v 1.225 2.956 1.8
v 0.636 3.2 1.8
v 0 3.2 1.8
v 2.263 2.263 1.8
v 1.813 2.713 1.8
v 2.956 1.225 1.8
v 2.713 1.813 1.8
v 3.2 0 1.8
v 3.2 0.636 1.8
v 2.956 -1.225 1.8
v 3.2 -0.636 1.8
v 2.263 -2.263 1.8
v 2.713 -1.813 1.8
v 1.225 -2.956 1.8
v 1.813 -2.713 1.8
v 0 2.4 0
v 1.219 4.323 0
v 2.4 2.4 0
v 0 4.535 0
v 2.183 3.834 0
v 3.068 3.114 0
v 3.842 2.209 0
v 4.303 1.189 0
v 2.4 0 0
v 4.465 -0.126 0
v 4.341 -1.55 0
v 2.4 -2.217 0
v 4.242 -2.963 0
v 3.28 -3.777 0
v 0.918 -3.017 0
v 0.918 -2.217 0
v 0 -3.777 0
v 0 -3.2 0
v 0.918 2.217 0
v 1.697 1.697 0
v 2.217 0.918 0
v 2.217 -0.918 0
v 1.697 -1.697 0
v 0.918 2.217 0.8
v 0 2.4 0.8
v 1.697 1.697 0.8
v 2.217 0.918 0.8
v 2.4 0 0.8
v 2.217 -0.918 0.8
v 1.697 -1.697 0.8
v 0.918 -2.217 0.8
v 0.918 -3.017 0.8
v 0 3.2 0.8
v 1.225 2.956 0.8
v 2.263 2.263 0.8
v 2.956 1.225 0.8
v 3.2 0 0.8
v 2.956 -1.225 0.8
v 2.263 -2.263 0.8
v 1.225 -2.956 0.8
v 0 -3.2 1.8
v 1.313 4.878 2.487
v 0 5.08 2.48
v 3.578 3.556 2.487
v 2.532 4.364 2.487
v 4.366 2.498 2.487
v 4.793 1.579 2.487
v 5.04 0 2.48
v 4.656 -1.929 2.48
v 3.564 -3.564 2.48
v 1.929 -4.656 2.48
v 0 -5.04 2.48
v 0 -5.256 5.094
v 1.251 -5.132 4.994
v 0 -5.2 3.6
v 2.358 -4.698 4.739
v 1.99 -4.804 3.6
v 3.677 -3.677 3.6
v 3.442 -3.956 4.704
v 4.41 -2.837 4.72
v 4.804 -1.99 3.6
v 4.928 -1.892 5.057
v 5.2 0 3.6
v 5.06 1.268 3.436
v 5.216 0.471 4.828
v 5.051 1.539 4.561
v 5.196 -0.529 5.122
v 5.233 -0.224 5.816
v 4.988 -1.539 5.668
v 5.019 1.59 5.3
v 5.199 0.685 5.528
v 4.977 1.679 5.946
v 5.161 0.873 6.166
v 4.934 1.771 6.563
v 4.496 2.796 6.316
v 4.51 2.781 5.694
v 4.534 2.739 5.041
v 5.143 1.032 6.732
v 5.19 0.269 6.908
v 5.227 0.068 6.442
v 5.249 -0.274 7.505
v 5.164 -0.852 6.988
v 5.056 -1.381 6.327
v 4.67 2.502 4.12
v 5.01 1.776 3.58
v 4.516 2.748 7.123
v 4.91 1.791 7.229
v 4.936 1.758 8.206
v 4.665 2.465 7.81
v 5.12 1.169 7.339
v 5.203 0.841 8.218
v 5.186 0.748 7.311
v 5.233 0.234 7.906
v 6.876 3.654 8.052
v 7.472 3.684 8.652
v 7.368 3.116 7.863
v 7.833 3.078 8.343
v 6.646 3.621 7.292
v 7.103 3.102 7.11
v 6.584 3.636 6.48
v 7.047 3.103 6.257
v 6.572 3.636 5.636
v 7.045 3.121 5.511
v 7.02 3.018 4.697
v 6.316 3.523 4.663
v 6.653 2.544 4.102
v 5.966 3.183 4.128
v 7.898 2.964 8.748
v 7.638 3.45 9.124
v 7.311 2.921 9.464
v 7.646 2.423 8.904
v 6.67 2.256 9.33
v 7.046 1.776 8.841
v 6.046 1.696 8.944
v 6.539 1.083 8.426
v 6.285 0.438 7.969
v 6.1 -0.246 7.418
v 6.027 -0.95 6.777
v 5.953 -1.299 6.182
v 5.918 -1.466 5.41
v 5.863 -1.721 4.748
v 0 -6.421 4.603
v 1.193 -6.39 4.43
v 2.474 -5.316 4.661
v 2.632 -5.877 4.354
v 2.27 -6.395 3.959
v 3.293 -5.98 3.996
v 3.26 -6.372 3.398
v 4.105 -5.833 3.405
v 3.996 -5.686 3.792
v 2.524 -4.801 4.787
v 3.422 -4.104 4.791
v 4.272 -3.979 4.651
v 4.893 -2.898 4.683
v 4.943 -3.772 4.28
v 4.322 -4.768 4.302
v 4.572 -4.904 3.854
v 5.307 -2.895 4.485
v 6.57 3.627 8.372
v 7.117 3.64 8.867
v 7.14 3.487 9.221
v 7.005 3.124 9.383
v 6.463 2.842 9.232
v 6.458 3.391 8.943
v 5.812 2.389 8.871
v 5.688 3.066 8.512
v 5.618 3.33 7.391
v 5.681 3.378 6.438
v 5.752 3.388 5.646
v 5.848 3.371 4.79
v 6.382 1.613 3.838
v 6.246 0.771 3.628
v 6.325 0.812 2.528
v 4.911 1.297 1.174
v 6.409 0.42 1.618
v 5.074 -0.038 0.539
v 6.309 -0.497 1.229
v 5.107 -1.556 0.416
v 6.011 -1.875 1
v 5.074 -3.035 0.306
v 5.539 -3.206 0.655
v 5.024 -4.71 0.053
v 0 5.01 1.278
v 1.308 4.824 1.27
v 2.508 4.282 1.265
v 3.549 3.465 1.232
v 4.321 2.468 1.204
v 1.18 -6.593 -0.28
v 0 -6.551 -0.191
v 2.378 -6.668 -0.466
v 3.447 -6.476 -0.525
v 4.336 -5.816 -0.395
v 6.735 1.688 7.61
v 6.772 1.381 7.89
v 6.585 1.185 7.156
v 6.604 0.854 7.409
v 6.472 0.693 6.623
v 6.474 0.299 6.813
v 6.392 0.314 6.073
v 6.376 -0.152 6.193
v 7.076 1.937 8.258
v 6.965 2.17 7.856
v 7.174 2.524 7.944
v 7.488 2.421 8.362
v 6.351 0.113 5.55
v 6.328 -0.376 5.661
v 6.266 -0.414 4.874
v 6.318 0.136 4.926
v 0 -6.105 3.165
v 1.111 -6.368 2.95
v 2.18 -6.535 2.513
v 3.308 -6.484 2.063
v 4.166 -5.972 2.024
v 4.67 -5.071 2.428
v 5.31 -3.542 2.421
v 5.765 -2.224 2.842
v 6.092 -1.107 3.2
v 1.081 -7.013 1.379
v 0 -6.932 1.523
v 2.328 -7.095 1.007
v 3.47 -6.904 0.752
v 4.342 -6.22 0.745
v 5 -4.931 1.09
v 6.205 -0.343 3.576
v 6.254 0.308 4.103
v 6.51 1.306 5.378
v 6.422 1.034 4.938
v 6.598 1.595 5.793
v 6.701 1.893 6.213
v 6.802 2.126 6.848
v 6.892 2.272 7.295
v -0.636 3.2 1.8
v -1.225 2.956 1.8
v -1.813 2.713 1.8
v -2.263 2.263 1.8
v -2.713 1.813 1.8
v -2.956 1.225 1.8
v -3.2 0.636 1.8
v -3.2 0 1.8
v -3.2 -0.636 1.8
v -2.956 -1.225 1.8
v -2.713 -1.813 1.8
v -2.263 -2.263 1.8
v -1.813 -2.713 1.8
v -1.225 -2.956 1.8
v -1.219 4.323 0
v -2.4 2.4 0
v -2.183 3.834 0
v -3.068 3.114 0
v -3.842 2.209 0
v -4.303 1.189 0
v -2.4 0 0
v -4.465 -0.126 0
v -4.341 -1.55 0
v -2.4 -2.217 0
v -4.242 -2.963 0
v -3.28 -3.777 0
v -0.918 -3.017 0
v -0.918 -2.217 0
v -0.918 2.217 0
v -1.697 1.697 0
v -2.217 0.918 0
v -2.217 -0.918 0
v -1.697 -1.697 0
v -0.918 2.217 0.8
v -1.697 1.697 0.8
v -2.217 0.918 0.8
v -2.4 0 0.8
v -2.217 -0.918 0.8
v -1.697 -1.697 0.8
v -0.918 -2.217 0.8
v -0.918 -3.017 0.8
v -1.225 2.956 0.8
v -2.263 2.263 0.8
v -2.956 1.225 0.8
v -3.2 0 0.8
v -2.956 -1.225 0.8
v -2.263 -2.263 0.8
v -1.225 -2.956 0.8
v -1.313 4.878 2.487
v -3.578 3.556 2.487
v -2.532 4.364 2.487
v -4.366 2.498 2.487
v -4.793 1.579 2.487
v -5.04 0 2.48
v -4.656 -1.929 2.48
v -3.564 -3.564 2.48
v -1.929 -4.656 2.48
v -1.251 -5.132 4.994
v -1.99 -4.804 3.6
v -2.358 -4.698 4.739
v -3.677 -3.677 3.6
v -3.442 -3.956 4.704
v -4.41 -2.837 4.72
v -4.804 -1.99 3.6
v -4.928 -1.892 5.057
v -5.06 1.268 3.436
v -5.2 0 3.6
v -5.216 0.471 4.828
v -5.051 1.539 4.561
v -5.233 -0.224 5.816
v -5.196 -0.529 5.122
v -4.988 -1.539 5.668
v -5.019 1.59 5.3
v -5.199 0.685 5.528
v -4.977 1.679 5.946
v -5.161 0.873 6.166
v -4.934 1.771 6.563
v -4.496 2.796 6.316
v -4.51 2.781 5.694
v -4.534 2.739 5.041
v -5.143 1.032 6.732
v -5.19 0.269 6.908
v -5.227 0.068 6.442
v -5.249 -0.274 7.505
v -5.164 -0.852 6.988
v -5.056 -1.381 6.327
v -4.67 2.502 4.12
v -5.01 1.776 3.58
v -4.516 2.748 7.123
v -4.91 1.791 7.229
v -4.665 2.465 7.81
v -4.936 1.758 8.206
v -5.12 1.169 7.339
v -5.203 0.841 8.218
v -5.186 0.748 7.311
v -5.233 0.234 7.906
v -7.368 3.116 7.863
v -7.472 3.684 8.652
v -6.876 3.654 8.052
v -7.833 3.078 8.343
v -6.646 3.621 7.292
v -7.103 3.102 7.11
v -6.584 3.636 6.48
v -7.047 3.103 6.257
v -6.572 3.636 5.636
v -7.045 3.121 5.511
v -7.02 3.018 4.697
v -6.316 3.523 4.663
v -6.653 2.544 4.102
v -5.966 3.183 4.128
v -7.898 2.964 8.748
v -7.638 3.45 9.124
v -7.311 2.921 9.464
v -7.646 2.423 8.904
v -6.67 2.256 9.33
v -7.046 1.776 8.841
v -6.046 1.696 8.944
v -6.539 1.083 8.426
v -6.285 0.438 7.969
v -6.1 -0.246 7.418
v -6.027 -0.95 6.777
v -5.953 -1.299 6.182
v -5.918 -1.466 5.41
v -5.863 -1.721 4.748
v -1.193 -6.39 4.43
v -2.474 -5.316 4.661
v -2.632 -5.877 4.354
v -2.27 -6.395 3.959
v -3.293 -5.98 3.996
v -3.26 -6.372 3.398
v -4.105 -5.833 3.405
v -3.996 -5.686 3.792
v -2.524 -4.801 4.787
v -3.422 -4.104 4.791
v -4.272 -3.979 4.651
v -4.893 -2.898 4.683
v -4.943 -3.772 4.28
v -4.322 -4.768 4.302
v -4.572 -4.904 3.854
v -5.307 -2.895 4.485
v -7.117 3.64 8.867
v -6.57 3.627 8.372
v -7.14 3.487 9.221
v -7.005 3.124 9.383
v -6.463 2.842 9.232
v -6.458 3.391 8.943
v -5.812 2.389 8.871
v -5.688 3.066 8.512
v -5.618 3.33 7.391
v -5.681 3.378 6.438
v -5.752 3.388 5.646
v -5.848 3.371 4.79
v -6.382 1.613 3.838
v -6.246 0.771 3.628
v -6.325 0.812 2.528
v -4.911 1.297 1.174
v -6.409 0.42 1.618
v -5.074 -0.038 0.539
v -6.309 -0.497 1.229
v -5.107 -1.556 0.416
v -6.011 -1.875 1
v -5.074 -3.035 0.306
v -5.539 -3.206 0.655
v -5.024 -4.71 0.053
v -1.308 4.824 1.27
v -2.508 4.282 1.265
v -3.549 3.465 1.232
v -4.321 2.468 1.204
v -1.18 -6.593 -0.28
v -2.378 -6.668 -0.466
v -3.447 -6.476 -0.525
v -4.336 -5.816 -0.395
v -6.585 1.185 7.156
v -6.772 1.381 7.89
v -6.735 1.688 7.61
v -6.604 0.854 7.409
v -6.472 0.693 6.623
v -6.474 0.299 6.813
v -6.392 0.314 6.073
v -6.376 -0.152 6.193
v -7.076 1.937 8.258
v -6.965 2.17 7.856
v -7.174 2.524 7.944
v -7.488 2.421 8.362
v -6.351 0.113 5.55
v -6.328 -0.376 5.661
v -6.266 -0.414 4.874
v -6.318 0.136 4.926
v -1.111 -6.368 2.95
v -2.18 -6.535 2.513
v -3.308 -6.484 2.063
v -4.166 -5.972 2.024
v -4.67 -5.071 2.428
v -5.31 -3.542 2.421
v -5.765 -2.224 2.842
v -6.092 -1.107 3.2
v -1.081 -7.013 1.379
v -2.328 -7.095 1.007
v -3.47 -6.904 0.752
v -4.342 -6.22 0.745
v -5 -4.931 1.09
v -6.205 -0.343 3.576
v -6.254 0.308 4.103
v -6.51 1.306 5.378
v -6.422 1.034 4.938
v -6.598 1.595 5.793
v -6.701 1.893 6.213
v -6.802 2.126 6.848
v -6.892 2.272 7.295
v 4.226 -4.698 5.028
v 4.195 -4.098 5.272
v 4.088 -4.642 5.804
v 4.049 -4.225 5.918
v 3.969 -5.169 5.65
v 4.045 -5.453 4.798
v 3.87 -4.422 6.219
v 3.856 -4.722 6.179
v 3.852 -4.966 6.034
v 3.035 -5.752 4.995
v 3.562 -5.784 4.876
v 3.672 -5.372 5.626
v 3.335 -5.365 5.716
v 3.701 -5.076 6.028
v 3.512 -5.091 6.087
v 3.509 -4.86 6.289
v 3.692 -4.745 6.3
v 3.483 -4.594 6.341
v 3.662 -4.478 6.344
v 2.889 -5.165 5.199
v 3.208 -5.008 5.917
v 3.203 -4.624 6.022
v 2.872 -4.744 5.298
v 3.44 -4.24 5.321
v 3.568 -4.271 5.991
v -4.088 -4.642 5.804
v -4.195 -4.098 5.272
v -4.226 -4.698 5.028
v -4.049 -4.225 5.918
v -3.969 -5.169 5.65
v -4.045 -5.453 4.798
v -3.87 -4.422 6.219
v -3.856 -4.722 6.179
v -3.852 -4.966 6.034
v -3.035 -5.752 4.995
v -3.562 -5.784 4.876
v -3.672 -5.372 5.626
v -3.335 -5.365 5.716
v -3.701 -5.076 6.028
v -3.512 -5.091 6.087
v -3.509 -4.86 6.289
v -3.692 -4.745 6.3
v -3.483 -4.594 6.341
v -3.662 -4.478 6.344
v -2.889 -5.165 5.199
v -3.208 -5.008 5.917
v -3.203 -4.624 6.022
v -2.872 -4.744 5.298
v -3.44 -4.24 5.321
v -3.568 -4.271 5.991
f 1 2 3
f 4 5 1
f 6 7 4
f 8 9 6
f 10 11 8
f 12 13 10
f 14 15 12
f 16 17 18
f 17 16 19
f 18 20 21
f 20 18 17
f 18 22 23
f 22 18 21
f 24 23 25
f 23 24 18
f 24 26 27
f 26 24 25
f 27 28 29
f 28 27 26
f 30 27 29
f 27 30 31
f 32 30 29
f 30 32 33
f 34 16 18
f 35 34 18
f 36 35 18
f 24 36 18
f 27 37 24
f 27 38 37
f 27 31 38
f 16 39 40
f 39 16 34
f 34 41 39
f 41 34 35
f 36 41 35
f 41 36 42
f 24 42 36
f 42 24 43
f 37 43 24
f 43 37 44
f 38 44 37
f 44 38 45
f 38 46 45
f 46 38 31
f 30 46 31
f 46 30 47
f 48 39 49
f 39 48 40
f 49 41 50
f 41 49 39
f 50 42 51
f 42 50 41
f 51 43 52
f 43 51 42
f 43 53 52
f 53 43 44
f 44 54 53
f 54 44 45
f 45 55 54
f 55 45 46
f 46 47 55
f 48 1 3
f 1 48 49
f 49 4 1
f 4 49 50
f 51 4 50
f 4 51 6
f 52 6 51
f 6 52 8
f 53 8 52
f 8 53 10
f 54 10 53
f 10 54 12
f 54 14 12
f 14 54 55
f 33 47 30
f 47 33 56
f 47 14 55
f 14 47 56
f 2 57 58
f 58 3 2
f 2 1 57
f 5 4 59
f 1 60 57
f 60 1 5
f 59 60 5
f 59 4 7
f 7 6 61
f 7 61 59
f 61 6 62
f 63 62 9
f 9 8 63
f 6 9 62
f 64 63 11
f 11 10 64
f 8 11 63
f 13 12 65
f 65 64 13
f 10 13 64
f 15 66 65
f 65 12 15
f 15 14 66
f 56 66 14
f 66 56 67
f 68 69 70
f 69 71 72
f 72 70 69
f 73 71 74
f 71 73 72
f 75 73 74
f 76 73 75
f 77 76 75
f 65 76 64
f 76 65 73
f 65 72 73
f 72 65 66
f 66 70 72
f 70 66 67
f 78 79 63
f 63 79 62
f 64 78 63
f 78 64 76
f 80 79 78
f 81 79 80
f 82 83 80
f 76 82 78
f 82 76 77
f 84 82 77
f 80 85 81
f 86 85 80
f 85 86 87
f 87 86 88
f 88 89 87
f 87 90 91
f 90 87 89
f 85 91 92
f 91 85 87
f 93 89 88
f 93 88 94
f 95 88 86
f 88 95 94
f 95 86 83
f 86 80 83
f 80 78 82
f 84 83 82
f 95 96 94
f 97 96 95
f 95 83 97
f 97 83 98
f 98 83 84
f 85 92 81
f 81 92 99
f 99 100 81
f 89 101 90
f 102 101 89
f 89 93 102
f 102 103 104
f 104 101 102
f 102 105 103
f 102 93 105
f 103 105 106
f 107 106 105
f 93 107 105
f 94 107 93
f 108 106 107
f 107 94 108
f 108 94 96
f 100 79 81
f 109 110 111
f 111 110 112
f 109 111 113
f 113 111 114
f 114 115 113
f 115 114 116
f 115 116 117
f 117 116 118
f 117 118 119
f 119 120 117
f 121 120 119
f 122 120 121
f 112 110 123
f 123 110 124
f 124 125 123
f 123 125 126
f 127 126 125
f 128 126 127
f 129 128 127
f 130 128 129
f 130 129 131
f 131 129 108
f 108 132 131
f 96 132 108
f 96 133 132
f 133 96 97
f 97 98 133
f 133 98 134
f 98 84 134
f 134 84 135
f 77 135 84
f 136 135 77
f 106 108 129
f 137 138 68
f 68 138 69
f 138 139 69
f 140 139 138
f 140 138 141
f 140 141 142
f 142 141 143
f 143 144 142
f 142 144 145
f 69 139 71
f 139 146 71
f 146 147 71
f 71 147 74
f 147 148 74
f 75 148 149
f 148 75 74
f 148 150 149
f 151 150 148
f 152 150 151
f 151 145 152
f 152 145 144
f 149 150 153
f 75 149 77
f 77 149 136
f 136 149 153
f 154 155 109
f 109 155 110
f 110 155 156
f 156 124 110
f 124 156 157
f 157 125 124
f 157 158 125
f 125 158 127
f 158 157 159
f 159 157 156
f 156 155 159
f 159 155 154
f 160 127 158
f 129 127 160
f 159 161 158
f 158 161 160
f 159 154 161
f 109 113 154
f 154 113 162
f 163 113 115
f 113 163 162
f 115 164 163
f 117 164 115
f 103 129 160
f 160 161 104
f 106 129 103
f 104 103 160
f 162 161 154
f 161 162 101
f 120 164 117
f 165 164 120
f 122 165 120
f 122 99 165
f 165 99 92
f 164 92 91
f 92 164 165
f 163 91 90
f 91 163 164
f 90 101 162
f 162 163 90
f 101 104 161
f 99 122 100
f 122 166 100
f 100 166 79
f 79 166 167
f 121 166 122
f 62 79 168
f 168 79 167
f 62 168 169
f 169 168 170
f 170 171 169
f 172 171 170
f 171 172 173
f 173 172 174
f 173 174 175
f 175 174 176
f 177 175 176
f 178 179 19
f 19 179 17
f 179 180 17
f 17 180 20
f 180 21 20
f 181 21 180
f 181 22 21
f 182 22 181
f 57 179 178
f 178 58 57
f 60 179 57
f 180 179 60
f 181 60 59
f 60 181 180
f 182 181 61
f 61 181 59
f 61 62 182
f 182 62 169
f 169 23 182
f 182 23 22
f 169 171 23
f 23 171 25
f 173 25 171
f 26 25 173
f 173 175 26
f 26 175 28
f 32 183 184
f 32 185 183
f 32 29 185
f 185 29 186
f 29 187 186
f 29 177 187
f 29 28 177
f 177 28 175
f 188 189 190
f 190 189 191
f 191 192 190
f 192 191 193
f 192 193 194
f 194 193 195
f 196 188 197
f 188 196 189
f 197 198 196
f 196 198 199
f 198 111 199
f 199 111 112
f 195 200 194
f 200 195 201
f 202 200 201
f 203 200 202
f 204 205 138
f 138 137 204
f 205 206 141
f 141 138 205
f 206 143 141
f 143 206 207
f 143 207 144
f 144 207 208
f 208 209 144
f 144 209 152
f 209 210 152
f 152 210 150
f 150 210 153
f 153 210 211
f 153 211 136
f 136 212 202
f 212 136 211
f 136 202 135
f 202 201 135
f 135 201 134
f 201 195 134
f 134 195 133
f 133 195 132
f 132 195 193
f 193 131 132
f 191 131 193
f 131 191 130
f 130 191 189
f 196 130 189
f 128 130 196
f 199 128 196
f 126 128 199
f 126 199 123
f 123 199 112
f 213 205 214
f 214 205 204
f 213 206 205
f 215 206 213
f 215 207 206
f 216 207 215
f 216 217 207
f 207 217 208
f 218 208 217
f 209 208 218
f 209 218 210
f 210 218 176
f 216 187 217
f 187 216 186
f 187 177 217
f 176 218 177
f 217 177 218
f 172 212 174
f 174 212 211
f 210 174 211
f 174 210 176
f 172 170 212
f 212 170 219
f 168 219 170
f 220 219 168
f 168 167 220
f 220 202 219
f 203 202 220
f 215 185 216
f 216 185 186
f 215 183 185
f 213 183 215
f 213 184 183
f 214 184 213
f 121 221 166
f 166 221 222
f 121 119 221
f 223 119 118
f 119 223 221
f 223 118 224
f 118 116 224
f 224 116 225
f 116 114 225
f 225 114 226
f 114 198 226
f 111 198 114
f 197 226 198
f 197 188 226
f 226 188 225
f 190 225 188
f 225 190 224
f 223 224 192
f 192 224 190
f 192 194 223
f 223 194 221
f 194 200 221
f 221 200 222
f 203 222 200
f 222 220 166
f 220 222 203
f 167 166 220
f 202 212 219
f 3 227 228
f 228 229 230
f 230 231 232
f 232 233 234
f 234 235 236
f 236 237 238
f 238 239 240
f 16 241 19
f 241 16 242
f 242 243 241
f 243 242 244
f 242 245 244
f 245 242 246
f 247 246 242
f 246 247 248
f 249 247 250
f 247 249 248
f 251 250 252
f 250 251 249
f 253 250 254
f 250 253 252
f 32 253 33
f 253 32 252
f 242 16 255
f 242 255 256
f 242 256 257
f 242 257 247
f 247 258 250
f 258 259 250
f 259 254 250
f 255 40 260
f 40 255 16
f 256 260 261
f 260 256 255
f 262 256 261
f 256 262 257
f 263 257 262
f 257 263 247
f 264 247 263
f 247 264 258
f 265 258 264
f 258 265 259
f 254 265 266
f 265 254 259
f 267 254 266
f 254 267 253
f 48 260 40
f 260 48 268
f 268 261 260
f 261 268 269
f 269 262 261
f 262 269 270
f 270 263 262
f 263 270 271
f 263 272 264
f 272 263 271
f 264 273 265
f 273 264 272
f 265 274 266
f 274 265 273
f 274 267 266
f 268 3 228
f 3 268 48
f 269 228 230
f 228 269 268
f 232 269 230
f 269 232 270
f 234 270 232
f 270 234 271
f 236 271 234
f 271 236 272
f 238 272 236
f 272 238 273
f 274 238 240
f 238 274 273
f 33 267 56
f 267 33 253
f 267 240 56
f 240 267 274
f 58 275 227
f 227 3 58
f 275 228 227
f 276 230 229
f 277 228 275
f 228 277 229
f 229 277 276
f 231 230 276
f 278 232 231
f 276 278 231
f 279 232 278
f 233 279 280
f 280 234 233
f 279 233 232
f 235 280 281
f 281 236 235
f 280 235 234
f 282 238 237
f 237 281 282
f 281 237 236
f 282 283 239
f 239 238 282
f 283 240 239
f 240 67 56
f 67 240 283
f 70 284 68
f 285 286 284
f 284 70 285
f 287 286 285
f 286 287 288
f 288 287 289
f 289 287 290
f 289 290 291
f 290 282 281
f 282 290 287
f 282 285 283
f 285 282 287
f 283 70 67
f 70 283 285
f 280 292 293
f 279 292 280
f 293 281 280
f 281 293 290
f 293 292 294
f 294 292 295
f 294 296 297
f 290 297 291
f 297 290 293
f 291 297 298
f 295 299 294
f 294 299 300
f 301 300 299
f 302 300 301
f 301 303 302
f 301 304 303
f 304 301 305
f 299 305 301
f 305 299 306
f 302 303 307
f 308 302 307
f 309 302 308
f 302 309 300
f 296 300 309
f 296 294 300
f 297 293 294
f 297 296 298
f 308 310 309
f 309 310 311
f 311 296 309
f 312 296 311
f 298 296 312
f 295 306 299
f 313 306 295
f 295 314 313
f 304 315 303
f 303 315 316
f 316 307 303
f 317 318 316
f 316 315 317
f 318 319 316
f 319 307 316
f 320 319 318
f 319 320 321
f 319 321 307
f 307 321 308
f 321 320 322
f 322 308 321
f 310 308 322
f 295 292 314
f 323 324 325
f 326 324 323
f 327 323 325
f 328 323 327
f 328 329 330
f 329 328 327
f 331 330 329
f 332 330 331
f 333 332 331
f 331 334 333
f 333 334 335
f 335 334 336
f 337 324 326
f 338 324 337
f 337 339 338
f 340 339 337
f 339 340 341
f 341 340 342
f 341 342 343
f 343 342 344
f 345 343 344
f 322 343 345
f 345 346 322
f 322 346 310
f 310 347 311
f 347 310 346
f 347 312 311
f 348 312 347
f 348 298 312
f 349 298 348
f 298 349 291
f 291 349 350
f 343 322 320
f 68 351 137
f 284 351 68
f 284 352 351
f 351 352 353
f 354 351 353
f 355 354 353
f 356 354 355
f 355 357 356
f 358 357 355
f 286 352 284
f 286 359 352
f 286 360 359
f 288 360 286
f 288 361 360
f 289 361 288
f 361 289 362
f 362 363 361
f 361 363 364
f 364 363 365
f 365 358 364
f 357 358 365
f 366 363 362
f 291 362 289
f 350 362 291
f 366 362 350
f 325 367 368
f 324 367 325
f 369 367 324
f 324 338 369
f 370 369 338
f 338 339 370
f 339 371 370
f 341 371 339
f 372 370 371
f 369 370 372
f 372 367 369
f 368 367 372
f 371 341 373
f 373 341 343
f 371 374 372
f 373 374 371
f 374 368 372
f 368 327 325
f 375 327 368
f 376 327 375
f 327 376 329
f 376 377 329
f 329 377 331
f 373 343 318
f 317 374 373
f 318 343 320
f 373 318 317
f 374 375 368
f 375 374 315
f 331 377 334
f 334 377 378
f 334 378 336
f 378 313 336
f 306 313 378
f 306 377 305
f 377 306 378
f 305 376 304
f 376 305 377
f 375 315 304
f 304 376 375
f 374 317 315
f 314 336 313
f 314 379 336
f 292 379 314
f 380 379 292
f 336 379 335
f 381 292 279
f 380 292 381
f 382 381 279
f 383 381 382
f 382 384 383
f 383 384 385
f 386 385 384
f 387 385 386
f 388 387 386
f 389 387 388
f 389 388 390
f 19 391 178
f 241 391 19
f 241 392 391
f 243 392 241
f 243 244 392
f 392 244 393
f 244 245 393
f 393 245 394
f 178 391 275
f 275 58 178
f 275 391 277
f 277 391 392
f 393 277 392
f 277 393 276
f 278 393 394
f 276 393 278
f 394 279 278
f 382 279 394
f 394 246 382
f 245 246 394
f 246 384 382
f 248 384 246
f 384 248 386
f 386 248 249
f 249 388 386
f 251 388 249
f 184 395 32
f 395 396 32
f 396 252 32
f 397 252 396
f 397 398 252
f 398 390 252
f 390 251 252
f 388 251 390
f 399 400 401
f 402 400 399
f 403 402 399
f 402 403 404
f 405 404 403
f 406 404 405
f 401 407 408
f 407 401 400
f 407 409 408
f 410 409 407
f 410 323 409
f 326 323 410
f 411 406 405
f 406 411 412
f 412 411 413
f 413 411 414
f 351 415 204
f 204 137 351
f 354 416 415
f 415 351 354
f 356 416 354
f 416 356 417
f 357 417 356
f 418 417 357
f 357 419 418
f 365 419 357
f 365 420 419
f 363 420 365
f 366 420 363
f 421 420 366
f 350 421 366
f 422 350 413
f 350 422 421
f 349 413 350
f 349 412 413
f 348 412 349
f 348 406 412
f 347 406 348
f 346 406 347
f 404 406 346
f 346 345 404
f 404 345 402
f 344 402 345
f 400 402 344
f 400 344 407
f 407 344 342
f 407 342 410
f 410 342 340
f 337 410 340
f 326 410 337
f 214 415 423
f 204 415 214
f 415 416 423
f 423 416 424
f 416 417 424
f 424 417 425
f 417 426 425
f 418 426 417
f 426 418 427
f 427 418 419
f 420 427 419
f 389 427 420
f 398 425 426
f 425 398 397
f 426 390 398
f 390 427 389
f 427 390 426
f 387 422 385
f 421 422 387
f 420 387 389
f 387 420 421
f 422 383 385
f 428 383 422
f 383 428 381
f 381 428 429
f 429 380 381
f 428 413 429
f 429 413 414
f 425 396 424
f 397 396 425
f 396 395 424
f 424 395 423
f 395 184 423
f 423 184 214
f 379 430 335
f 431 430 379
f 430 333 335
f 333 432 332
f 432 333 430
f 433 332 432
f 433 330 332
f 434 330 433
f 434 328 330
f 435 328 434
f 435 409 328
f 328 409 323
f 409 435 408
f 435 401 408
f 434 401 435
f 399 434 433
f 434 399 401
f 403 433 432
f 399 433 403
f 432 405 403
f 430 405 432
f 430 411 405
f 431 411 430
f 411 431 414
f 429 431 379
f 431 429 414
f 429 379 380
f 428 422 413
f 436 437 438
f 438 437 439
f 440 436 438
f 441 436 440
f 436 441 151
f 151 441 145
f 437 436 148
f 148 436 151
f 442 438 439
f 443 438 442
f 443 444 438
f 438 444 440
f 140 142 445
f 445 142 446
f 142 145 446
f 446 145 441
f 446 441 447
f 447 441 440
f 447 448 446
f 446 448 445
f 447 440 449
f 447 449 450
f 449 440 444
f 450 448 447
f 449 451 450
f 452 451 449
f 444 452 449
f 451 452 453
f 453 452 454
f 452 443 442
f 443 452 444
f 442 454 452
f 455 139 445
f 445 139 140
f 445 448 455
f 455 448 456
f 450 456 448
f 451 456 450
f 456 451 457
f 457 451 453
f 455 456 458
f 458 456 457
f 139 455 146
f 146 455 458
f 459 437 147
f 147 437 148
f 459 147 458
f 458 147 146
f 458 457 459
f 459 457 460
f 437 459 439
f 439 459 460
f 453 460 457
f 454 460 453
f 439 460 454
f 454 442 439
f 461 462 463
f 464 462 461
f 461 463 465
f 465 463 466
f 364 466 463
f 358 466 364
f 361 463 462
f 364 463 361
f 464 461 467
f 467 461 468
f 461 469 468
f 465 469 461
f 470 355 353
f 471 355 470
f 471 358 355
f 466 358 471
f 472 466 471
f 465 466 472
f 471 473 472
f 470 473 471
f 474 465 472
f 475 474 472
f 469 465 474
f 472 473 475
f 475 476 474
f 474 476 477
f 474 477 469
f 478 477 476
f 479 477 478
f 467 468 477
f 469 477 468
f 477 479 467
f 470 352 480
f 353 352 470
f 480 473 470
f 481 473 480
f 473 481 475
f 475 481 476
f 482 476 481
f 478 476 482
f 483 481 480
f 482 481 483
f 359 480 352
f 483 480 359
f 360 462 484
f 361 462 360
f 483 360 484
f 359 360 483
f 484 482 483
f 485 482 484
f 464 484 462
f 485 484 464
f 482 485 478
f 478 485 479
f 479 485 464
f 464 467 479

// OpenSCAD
use <../lib.scad>
use <s/2576s01.scad>
use <s/2576s03.scad>
function ldraw_lib__2576p01() = [
// 0 Minifig Large Lower Jaw with White Canines and Pointed Ears Pattern
// 0 Name: 2576p01.dat
// 0 Author: Gerald Lasser [GeraldLasser]
// 0 !LDRAW_ORG Part UPDATE 2026-07
// 0 !LICENSE Licensed under CC BY 4.0 : see CAreadme.txt
// 
// 0 BFC CERTIFY CCW
  [0,"BFC","CERTIFY"],
  [0,"BFC","CCW"],
// 
// 0 !CATEGORY Minifig Neckwear
// 0 !KEYWORDS Bricklink 2576pb01, Brickowl 390045, Brickset 101020
// 0 !KEYWORDS Collectible Minifigures, Orc, Rebrickable 2576pat0001, Series 24
// 0 !KEYWORDS Set 71037
// 
// 0 !HISTORY 2026-07-30 [OrionP] Official Update 2026-07
// 
// 1 16 0 0 0 1 0 0 0 1 0 0 0 1 s\2576s01.dat
  [1,16,0,0,0,1,0,0,0,1,0,0,0,1, ldraw_lib__s__2576s01()],
// 
// 1 15 0 0 0 1 0 0 0 1 0 0 0 1 s\2576s03.dat
  [1,15,0,0,0,1,0,0,0,1,0,0,0,1, ldraw_lib__s__2576s03()],
// 1 15 0 0 0 -1 0 0 0 1 0 0 0 1 s\2576s03.dat
  [1,15,0,0,0,-1,0,0,0,1,0,0,0,1, ldraw_lib__s__2576s03()],
];
module ldraw_lib__2576p01(step=0, col=false, unit=2/5, alt=false, line=0.2, solid=!$preview)
    makepoly(ldraw_lib__2576p01(), step=step, col=col, unit=unit, alt=alt, line=line, solid=solid);
ldraw_lib__2576p01(line=0.2);
